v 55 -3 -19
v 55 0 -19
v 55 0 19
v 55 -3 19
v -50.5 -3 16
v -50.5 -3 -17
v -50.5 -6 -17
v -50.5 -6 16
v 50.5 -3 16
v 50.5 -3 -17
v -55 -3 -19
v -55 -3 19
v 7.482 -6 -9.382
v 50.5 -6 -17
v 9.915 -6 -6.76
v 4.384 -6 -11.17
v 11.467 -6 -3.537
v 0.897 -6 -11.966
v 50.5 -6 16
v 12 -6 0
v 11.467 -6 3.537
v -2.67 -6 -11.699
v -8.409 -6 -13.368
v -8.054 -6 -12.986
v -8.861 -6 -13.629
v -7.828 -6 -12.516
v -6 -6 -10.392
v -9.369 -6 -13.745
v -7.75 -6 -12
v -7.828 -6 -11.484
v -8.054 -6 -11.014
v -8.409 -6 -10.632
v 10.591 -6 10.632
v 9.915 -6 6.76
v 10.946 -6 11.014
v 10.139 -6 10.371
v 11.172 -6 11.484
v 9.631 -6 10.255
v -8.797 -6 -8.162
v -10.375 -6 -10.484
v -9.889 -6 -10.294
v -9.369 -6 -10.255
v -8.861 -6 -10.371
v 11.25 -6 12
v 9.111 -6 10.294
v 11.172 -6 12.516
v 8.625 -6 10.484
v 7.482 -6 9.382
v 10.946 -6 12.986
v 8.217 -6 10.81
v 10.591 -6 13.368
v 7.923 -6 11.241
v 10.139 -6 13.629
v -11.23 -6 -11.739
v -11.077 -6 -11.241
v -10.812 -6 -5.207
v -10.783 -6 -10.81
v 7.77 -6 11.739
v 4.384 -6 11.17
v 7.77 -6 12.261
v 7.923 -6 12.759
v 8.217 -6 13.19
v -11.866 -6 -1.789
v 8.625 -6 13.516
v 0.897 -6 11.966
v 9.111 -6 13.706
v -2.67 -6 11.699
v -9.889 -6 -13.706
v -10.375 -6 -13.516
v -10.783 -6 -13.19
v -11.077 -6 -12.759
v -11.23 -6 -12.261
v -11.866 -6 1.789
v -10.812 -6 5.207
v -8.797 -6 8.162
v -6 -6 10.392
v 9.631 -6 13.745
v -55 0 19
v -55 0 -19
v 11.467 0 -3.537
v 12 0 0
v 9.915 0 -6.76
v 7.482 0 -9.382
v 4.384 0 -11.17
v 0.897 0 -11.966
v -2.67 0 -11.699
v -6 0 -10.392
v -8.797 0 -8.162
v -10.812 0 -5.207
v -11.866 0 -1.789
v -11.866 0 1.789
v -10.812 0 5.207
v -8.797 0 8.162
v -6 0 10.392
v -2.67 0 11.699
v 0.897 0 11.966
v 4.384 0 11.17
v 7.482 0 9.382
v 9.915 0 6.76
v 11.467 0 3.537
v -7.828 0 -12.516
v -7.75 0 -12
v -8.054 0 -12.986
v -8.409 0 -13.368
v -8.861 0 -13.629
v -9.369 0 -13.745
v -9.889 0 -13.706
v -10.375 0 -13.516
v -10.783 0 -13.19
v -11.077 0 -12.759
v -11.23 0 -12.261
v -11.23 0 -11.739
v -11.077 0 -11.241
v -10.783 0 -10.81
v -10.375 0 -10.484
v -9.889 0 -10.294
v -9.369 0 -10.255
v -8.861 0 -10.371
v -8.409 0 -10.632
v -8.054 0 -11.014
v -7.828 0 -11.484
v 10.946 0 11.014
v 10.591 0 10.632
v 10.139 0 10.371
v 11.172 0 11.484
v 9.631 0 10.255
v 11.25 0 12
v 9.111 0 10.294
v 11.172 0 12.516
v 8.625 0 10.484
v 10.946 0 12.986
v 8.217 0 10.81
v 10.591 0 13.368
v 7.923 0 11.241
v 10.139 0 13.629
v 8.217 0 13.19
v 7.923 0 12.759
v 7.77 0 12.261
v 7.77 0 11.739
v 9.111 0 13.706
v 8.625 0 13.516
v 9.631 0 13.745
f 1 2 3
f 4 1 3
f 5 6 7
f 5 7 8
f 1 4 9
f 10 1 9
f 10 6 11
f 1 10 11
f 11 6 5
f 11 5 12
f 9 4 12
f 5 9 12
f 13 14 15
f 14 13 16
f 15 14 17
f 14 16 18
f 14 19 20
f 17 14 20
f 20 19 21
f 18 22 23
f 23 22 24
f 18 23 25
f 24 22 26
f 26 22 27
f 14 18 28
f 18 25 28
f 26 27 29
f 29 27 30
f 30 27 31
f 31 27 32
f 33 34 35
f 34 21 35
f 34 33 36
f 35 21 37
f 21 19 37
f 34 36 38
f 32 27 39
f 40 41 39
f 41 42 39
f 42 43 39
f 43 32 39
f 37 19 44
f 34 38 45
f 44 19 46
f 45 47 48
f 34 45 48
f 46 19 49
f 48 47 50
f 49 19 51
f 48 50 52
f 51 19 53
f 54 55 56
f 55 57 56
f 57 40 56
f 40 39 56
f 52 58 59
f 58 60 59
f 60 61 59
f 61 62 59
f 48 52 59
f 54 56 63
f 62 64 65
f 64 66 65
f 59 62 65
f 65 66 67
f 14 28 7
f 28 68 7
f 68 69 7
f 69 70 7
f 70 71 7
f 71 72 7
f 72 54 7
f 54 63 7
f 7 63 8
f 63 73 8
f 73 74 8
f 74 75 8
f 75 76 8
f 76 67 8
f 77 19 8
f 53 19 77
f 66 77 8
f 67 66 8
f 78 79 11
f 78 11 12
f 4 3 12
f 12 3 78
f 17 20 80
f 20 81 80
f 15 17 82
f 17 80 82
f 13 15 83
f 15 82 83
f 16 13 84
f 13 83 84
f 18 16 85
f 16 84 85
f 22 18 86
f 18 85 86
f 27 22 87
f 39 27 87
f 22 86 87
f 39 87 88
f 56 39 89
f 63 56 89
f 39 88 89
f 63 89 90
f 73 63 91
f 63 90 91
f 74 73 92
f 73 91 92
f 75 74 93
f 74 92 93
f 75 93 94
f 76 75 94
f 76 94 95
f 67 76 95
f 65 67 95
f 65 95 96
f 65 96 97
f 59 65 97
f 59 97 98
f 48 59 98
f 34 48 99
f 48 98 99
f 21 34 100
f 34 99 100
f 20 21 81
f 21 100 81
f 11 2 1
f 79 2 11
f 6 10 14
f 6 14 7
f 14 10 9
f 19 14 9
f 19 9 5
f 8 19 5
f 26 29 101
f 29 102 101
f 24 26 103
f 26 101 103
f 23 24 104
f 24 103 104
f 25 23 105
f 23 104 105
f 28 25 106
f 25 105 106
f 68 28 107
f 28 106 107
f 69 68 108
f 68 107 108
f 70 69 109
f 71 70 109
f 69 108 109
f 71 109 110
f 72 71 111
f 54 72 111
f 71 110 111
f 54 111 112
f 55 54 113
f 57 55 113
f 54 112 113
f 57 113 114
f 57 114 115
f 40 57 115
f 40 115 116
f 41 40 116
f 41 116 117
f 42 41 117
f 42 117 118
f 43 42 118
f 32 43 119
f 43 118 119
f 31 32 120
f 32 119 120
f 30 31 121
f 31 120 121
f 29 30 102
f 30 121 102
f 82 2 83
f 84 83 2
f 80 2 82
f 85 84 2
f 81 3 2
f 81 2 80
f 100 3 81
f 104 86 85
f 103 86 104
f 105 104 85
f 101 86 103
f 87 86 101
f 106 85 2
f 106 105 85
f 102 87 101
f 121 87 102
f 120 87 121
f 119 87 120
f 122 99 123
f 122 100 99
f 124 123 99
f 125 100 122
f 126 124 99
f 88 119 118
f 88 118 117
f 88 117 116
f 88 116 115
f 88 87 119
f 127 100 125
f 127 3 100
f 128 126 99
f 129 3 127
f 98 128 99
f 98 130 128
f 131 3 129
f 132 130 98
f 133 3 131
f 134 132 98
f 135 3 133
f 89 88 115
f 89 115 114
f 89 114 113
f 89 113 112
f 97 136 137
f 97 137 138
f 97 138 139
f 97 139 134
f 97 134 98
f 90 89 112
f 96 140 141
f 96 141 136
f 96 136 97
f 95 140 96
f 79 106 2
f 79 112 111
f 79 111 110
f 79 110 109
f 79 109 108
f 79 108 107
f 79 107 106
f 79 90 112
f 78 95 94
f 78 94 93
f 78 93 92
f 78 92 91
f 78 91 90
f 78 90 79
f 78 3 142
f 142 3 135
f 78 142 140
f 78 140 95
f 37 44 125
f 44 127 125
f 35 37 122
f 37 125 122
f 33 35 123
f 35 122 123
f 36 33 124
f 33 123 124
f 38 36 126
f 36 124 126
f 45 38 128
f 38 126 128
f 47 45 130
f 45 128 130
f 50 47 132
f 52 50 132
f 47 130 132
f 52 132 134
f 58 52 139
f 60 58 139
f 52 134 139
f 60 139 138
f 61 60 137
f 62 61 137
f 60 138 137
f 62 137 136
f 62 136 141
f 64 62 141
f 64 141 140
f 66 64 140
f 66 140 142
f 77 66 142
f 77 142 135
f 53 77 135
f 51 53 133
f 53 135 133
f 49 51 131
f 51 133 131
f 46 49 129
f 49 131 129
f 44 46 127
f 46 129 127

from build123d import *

# Parameters (mm, degrees)
SKETCH_W          = 55
SKETCH_H          = 38
PAD_DEPTH         = 3
SKETCH001_W       = 50.5
SKETCH001_H       = 33
PAD001_DEPTH      = 3
SKETCH003_R       = 1.75
SKETCH003_R_2     = 12
POCKET_DEPTH      = 5
POCKET_DEPTH_BACK = 5


with BuildPart() as part:
    # Sketch → Pad (new body)
    with BuildSketch(Plane.XZ):
        with Locations((27.5, 0)):
            Rectangle(SKETCH_W, SKETCH_H)
    pad = extrude(amount=PAD_DEPTH)

    # Sketch001 (on Face6 of Pad) → Pad001 (join)
    with BuildSketch(Plane.XZ.offset(3)):
        with Locations((25.25, -0.5)):
            Rectangle(SKETCH001_W, SKETCH001_H)
    pad001 = extrude(amount=PAD001_DEPTH)

    # Mirrored: Pad, Pad001 across Sketch V_Axis
    add(pad.mirror(Plane(origin=(0, 0, 0), x_dir=(0, -1, 0), z_dir=(1, 0, 0))))
    add(pad001.mirror(Plane(origin=(0, 0, 0), x_dir=(0, -1, 0), z_dir=(1, 0, 0))))

    # Sketch003 → Pocket (cut, two sides)
    with BuildSketch(Plane(origin=(0, -3, 0), x_dir=(1, 0, 0), z_dir=(0, 1, 0))) as pocket_sk:
        with Locations((9.5, -12)):
            Circle(SKETCH003_R)
        with Locations((-9.5, 12)):
            Circle(SKETCH003_R)
        Circle(SKETCH003_R_2)
    extrude(amount=POCKET_DEPTH, mode=Mode.SUBTRACT)
    extrude(pocket_sk.sketch, amount=-POCKET_DEPTH_BACK, mode=Mode.SUBTRACT)


solid = part.part
